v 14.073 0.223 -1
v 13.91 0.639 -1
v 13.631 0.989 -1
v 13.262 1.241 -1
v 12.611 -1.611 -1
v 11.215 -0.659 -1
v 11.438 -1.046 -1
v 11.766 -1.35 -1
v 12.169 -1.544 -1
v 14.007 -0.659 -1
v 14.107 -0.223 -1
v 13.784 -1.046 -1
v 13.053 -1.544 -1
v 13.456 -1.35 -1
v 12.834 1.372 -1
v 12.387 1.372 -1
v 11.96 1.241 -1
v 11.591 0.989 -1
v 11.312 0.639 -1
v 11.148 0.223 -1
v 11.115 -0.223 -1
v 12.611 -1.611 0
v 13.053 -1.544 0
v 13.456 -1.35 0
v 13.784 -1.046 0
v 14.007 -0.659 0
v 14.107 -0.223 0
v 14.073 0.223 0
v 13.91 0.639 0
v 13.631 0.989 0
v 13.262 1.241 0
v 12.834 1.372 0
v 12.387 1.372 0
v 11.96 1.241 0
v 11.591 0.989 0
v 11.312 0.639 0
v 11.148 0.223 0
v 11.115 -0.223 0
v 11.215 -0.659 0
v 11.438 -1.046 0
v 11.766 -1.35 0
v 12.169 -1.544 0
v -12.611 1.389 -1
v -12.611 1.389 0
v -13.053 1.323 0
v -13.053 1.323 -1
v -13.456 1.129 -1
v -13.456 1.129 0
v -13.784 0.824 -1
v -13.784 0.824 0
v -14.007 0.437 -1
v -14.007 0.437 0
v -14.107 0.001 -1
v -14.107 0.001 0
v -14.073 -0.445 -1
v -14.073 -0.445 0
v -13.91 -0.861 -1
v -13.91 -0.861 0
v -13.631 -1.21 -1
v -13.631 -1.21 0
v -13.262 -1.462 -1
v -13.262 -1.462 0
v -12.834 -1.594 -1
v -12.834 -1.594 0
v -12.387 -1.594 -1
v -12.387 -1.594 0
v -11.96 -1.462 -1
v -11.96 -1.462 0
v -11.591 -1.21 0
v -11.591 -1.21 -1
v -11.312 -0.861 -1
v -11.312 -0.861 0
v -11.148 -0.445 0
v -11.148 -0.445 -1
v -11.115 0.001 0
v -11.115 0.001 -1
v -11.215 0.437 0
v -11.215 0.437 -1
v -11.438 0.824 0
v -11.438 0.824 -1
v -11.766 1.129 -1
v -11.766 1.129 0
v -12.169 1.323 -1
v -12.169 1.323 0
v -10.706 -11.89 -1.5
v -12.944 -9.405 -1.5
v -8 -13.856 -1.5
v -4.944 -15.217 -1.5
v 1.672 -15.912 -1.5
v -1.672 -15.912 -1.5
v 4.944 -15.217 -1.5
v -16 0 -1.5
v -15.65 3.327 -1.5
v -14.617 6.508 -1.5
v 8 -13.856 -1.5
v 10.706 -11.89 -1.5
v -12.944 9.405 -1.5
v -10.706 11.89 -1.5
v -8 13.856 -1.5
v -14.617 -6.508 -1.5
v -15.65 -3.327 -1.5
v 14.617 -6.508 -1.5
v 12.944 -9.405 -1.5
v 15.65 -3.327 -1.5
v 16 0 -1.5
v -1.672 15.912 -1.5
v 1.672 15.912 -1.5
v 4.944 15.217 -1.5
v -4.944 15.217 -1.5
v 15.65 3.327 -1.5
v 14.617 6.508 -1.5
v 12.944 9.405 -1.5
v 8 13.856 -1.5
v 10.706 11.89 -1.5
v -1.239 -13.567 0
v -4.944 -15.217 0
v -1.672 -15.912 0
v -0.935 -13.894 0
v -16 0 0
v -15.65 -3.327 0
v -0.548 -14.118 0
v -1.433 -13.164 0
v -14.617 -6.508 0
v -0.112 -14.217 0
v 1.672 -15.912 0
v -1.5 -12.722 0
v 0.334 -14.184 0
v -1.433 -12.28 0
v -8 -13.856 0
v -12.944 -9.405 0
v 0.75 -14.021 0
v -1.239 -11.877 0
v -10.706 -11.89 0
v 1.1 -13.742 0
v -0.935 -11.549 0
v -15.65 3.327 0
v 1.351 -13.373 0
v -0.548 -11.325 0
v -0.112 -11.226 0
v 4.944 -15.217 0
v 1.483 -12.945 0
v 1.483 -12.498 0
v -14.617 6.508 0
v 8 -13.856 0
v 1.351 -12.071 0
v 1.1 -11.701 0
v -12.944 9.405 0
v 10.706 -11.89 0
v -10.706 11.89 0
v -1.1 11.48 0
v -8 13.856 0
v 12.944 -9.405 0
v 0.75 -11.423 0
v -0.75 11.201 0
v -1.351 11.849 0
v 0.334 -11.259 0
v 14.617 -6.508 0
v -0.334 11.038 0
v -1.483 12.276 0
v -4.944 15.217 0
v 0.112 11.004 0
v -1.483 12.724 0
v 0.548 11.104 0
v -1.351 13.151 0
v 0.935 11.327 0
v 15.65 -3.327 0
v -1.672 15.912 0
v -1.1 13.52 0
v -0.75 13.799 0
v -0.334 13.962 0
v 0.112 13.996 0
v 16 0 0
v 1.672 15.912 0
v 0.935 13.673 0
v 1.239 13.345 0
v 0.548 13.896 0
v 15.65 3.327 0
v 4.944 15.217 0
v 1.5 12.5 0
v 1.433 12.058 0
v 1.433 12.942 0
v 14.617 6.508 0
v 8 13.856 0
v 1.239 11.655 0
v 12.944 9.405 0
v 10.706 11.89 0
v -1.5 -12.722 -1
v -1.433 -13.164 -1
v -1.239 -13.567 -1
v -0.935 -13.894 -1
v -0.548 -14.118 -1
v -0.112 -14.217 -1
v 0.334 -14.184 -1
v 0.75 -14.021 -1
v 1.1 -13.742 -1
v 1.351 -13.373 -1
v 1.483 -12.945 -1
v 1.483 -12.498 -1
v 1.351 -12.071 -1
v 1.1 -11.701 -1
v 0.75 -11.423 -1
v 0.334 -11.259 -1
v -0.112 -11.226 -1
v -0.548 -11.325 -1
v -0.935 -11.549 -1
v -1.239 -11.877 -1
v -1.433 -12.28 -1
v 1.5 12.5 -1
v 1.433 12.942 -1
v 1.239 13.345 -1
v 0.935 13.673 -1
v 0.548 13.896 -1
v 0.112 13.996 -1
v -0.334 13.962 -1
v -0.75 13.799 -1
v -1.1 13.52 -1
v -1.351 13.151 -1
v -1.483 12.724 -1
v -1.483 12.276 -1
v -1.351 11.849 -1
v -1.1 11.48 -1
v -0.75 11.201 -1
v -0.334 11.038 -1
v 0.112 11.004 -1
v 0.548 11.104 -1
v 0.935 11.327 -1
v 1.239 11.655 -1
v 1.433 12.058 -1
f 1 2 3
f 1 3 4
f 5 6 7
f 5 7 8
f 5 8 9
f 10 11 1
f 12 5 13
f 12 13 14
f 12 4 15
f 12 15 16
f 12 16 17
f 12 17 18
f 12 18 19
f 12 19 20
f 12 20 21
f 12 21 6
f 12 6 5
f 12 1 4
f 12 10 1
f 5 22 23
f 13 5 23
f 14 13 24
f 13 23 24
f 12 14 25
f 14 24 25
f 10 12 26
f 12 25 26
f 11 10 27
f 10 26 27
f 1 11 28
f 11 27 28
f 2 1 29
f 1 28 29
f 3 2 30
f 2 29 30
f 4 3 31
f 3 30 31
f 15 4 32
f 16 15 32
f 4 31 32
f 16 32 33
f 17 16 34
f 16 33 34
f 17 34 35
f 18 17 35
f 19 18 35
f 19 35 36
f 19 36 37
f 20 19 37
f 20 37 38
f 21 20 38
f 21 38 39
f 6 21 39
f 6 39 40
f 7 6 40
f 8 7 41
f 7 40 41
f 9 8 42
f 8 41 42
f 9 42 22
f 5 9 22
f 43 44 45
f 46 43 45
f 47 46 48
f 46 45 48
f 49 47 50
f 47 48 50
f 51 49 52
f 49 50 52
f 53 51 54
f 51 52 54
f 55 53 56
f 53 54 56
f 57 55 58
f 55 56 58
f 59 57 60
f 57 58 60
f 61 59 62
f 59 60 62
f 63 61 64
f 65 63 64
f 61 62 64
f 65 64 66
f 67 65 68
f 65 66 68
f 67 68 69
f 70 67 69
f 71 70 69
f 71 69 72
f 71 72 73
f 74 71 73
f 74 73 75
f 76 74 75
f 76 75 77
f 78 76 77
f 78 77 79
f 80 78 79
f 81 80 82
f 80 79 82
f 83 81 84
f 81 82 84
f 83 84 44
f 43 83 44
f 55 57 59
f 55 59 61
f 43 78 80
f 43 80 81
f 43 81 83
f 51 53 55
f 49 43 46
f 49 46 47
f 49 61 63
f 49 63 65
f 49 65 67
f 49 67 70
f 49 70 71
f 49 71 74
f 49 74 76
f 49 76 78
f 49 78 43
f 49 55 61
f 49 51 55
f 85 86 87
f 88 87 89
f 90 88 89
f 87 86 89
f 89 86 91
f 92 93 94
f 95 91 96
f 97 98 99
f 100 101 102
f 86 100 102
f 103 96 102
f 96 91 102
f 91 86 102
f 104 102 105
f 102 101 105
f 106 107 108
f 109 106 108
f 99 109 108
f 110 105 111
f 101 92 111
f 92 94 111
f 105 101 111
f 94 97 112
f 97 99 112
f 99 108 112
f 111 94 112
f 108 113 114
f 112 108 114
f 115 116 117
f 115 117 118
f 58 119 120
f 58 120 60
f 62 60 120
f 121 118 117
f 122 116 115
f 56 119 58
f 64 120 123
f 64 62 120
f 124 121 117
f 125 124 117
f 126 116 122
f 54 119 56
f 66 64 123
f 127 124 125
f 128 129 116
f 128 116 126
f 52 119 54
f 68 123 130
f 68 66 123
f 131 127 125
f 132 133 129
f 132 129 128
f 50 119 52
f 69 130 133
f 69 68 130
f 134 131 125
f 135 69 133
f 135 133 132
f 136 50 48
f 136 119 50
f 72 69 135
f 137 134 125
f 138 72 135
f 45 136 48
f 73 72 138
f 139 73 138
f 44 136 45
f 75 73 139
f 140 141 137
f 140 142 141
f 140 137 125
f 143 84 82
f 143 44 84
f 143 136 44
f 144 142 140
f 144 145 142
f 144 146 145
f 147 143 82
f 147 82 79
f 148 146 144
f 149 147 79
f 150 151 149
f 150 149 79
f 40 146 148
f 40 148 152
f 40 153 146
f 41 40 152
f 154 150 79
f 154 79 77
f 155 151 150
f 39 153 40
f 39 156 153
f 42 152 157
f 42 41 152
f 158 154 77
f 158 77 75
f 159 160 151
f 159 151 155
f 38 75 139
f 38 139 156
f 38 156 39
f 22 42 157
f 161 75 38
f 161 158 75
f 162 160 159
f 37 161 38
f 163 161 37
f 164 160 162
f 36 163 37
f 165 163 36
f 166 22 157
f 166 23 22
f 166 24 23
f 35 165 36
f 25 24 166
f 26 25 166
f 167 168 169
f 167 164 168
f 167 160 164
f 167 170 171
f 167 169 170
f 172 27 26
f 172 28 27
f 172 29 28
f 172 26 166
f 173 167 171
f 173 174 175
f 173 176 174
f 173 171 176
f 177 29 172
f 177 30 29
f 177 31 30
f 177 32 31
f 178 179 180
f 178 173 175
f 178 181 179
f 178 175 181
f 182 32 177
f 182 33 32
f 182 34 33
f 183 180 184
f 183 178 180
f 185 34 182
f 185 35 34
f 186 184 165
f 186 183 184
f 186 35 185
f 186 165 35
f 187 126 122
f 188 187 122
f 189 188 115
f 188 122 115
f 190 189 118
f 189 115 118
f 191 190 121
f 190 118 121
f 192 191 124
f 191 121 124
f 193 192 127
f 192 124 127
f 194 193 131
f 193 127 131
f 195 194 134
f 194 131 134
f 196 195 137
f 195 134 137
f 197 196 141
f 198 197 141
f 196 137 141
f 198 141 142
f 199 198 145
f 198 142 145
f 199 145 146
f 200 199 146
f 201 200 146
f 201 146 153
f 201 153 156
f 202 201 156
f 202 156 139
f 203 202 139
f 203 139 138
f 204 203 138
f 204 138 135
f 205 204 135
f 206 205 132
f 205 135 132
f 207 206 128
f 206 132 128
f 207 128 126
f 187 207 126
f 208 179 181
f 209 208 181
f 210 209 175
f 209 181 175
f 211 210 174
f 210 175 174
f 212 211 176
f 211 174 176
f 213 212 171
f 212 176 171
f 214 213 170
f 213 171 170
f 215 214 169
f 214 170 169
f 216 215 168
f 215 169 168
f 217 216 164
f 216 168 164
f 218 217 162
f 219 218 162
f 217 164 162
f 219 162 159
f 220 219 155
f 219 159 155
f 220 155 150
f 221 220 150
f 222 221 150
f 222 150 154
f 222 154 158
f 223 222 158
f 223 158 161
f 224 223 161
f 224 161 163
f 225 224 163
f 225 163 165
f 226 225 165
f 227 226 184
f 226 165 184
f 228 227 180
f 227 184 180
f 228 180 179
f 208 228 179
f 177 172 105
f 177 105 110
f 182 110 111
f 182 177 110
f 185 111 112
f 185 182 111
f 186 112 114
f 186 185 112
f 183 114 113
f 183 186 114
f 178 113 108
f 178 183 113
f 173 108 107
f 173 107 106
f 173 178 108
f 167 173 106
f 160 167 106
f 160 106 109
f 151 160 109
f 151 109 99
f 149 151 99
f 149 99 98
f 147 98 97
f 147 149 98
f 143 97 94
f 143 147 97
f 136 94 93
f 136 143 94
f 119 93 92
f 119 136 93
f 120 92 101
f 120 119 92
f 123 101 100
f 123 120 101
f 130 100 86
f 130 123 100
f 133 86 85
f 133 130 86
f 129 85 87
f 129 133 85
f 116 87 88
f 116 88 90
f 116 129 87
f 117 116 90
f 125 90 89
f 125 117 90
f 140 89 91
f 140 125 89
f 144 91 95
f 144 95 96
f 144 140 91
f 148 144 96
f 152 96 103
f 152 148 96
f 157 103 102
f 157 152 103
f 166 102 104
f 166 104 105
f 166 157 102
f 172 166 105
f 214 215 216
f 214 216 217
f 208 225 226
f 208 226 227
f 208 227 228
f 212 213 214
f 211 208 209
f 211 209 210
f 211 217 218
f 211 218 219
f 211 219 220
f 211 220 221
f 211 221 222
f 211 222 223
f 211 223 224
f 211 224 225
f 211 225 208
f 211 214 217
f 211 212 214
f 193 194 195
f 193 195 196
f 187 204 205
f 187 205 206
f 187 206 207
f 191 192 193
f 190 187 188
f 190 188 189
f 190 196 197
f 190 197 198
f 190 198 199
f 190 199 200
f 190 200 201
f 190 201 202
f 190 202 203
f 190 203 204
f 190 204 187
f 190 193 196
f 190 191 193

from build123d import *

# Parameters (mm, degrees)
SCHIZZO1_R                   = 16
ESTRUSIONE_ESTRUSIONE1_DEPTH = 1.5
SCHIZZO7_R                   = 1.5
TAGLIO_ESTRUSIONE1_DEPTH     = 1
RIPETIZIONECIRCOLARE1_COUNT  = 4


with BuildPart() as part:
    # Schizzo1 → Estrusione-Estrusione1 (new body)
    with BuildSketch(Plane.XY):
        Circle(SCHIZZO1_R)
    extrude(amount=-ESTRUSIONE_ESTRUSIONE1_DEPTH)

    # Schizzo7 → Taglio-Estrusione1 (cut)
    with BuildSketch(Plane.XY):
        with Locations((0, 12.5)):
            Circle(SCHIZZO7_R)
    taglio_estrusione1 = extrude(amount=-TAGLIO_ESTRUSIONE1_DEPTH, mode=Mode.SUBTRACT)

    # RipetizioneCircolare1: Taglio-Estrusione1 ×4 about axis
    ripetizionecircolare1_axis = Axis((0, -0.110837438, 0), (0, 0, 1))
    for i in range(1, RIPETIZIONECIRCOLARE1_COUNT):
        add(taglio_estrusione1.rotate(ripetizionecircolare1_axis, i * 360 / RIPETIZIONECIRCOLARE1_COUNT), mode=Mode.SUBTRACT)


solid = part.part
